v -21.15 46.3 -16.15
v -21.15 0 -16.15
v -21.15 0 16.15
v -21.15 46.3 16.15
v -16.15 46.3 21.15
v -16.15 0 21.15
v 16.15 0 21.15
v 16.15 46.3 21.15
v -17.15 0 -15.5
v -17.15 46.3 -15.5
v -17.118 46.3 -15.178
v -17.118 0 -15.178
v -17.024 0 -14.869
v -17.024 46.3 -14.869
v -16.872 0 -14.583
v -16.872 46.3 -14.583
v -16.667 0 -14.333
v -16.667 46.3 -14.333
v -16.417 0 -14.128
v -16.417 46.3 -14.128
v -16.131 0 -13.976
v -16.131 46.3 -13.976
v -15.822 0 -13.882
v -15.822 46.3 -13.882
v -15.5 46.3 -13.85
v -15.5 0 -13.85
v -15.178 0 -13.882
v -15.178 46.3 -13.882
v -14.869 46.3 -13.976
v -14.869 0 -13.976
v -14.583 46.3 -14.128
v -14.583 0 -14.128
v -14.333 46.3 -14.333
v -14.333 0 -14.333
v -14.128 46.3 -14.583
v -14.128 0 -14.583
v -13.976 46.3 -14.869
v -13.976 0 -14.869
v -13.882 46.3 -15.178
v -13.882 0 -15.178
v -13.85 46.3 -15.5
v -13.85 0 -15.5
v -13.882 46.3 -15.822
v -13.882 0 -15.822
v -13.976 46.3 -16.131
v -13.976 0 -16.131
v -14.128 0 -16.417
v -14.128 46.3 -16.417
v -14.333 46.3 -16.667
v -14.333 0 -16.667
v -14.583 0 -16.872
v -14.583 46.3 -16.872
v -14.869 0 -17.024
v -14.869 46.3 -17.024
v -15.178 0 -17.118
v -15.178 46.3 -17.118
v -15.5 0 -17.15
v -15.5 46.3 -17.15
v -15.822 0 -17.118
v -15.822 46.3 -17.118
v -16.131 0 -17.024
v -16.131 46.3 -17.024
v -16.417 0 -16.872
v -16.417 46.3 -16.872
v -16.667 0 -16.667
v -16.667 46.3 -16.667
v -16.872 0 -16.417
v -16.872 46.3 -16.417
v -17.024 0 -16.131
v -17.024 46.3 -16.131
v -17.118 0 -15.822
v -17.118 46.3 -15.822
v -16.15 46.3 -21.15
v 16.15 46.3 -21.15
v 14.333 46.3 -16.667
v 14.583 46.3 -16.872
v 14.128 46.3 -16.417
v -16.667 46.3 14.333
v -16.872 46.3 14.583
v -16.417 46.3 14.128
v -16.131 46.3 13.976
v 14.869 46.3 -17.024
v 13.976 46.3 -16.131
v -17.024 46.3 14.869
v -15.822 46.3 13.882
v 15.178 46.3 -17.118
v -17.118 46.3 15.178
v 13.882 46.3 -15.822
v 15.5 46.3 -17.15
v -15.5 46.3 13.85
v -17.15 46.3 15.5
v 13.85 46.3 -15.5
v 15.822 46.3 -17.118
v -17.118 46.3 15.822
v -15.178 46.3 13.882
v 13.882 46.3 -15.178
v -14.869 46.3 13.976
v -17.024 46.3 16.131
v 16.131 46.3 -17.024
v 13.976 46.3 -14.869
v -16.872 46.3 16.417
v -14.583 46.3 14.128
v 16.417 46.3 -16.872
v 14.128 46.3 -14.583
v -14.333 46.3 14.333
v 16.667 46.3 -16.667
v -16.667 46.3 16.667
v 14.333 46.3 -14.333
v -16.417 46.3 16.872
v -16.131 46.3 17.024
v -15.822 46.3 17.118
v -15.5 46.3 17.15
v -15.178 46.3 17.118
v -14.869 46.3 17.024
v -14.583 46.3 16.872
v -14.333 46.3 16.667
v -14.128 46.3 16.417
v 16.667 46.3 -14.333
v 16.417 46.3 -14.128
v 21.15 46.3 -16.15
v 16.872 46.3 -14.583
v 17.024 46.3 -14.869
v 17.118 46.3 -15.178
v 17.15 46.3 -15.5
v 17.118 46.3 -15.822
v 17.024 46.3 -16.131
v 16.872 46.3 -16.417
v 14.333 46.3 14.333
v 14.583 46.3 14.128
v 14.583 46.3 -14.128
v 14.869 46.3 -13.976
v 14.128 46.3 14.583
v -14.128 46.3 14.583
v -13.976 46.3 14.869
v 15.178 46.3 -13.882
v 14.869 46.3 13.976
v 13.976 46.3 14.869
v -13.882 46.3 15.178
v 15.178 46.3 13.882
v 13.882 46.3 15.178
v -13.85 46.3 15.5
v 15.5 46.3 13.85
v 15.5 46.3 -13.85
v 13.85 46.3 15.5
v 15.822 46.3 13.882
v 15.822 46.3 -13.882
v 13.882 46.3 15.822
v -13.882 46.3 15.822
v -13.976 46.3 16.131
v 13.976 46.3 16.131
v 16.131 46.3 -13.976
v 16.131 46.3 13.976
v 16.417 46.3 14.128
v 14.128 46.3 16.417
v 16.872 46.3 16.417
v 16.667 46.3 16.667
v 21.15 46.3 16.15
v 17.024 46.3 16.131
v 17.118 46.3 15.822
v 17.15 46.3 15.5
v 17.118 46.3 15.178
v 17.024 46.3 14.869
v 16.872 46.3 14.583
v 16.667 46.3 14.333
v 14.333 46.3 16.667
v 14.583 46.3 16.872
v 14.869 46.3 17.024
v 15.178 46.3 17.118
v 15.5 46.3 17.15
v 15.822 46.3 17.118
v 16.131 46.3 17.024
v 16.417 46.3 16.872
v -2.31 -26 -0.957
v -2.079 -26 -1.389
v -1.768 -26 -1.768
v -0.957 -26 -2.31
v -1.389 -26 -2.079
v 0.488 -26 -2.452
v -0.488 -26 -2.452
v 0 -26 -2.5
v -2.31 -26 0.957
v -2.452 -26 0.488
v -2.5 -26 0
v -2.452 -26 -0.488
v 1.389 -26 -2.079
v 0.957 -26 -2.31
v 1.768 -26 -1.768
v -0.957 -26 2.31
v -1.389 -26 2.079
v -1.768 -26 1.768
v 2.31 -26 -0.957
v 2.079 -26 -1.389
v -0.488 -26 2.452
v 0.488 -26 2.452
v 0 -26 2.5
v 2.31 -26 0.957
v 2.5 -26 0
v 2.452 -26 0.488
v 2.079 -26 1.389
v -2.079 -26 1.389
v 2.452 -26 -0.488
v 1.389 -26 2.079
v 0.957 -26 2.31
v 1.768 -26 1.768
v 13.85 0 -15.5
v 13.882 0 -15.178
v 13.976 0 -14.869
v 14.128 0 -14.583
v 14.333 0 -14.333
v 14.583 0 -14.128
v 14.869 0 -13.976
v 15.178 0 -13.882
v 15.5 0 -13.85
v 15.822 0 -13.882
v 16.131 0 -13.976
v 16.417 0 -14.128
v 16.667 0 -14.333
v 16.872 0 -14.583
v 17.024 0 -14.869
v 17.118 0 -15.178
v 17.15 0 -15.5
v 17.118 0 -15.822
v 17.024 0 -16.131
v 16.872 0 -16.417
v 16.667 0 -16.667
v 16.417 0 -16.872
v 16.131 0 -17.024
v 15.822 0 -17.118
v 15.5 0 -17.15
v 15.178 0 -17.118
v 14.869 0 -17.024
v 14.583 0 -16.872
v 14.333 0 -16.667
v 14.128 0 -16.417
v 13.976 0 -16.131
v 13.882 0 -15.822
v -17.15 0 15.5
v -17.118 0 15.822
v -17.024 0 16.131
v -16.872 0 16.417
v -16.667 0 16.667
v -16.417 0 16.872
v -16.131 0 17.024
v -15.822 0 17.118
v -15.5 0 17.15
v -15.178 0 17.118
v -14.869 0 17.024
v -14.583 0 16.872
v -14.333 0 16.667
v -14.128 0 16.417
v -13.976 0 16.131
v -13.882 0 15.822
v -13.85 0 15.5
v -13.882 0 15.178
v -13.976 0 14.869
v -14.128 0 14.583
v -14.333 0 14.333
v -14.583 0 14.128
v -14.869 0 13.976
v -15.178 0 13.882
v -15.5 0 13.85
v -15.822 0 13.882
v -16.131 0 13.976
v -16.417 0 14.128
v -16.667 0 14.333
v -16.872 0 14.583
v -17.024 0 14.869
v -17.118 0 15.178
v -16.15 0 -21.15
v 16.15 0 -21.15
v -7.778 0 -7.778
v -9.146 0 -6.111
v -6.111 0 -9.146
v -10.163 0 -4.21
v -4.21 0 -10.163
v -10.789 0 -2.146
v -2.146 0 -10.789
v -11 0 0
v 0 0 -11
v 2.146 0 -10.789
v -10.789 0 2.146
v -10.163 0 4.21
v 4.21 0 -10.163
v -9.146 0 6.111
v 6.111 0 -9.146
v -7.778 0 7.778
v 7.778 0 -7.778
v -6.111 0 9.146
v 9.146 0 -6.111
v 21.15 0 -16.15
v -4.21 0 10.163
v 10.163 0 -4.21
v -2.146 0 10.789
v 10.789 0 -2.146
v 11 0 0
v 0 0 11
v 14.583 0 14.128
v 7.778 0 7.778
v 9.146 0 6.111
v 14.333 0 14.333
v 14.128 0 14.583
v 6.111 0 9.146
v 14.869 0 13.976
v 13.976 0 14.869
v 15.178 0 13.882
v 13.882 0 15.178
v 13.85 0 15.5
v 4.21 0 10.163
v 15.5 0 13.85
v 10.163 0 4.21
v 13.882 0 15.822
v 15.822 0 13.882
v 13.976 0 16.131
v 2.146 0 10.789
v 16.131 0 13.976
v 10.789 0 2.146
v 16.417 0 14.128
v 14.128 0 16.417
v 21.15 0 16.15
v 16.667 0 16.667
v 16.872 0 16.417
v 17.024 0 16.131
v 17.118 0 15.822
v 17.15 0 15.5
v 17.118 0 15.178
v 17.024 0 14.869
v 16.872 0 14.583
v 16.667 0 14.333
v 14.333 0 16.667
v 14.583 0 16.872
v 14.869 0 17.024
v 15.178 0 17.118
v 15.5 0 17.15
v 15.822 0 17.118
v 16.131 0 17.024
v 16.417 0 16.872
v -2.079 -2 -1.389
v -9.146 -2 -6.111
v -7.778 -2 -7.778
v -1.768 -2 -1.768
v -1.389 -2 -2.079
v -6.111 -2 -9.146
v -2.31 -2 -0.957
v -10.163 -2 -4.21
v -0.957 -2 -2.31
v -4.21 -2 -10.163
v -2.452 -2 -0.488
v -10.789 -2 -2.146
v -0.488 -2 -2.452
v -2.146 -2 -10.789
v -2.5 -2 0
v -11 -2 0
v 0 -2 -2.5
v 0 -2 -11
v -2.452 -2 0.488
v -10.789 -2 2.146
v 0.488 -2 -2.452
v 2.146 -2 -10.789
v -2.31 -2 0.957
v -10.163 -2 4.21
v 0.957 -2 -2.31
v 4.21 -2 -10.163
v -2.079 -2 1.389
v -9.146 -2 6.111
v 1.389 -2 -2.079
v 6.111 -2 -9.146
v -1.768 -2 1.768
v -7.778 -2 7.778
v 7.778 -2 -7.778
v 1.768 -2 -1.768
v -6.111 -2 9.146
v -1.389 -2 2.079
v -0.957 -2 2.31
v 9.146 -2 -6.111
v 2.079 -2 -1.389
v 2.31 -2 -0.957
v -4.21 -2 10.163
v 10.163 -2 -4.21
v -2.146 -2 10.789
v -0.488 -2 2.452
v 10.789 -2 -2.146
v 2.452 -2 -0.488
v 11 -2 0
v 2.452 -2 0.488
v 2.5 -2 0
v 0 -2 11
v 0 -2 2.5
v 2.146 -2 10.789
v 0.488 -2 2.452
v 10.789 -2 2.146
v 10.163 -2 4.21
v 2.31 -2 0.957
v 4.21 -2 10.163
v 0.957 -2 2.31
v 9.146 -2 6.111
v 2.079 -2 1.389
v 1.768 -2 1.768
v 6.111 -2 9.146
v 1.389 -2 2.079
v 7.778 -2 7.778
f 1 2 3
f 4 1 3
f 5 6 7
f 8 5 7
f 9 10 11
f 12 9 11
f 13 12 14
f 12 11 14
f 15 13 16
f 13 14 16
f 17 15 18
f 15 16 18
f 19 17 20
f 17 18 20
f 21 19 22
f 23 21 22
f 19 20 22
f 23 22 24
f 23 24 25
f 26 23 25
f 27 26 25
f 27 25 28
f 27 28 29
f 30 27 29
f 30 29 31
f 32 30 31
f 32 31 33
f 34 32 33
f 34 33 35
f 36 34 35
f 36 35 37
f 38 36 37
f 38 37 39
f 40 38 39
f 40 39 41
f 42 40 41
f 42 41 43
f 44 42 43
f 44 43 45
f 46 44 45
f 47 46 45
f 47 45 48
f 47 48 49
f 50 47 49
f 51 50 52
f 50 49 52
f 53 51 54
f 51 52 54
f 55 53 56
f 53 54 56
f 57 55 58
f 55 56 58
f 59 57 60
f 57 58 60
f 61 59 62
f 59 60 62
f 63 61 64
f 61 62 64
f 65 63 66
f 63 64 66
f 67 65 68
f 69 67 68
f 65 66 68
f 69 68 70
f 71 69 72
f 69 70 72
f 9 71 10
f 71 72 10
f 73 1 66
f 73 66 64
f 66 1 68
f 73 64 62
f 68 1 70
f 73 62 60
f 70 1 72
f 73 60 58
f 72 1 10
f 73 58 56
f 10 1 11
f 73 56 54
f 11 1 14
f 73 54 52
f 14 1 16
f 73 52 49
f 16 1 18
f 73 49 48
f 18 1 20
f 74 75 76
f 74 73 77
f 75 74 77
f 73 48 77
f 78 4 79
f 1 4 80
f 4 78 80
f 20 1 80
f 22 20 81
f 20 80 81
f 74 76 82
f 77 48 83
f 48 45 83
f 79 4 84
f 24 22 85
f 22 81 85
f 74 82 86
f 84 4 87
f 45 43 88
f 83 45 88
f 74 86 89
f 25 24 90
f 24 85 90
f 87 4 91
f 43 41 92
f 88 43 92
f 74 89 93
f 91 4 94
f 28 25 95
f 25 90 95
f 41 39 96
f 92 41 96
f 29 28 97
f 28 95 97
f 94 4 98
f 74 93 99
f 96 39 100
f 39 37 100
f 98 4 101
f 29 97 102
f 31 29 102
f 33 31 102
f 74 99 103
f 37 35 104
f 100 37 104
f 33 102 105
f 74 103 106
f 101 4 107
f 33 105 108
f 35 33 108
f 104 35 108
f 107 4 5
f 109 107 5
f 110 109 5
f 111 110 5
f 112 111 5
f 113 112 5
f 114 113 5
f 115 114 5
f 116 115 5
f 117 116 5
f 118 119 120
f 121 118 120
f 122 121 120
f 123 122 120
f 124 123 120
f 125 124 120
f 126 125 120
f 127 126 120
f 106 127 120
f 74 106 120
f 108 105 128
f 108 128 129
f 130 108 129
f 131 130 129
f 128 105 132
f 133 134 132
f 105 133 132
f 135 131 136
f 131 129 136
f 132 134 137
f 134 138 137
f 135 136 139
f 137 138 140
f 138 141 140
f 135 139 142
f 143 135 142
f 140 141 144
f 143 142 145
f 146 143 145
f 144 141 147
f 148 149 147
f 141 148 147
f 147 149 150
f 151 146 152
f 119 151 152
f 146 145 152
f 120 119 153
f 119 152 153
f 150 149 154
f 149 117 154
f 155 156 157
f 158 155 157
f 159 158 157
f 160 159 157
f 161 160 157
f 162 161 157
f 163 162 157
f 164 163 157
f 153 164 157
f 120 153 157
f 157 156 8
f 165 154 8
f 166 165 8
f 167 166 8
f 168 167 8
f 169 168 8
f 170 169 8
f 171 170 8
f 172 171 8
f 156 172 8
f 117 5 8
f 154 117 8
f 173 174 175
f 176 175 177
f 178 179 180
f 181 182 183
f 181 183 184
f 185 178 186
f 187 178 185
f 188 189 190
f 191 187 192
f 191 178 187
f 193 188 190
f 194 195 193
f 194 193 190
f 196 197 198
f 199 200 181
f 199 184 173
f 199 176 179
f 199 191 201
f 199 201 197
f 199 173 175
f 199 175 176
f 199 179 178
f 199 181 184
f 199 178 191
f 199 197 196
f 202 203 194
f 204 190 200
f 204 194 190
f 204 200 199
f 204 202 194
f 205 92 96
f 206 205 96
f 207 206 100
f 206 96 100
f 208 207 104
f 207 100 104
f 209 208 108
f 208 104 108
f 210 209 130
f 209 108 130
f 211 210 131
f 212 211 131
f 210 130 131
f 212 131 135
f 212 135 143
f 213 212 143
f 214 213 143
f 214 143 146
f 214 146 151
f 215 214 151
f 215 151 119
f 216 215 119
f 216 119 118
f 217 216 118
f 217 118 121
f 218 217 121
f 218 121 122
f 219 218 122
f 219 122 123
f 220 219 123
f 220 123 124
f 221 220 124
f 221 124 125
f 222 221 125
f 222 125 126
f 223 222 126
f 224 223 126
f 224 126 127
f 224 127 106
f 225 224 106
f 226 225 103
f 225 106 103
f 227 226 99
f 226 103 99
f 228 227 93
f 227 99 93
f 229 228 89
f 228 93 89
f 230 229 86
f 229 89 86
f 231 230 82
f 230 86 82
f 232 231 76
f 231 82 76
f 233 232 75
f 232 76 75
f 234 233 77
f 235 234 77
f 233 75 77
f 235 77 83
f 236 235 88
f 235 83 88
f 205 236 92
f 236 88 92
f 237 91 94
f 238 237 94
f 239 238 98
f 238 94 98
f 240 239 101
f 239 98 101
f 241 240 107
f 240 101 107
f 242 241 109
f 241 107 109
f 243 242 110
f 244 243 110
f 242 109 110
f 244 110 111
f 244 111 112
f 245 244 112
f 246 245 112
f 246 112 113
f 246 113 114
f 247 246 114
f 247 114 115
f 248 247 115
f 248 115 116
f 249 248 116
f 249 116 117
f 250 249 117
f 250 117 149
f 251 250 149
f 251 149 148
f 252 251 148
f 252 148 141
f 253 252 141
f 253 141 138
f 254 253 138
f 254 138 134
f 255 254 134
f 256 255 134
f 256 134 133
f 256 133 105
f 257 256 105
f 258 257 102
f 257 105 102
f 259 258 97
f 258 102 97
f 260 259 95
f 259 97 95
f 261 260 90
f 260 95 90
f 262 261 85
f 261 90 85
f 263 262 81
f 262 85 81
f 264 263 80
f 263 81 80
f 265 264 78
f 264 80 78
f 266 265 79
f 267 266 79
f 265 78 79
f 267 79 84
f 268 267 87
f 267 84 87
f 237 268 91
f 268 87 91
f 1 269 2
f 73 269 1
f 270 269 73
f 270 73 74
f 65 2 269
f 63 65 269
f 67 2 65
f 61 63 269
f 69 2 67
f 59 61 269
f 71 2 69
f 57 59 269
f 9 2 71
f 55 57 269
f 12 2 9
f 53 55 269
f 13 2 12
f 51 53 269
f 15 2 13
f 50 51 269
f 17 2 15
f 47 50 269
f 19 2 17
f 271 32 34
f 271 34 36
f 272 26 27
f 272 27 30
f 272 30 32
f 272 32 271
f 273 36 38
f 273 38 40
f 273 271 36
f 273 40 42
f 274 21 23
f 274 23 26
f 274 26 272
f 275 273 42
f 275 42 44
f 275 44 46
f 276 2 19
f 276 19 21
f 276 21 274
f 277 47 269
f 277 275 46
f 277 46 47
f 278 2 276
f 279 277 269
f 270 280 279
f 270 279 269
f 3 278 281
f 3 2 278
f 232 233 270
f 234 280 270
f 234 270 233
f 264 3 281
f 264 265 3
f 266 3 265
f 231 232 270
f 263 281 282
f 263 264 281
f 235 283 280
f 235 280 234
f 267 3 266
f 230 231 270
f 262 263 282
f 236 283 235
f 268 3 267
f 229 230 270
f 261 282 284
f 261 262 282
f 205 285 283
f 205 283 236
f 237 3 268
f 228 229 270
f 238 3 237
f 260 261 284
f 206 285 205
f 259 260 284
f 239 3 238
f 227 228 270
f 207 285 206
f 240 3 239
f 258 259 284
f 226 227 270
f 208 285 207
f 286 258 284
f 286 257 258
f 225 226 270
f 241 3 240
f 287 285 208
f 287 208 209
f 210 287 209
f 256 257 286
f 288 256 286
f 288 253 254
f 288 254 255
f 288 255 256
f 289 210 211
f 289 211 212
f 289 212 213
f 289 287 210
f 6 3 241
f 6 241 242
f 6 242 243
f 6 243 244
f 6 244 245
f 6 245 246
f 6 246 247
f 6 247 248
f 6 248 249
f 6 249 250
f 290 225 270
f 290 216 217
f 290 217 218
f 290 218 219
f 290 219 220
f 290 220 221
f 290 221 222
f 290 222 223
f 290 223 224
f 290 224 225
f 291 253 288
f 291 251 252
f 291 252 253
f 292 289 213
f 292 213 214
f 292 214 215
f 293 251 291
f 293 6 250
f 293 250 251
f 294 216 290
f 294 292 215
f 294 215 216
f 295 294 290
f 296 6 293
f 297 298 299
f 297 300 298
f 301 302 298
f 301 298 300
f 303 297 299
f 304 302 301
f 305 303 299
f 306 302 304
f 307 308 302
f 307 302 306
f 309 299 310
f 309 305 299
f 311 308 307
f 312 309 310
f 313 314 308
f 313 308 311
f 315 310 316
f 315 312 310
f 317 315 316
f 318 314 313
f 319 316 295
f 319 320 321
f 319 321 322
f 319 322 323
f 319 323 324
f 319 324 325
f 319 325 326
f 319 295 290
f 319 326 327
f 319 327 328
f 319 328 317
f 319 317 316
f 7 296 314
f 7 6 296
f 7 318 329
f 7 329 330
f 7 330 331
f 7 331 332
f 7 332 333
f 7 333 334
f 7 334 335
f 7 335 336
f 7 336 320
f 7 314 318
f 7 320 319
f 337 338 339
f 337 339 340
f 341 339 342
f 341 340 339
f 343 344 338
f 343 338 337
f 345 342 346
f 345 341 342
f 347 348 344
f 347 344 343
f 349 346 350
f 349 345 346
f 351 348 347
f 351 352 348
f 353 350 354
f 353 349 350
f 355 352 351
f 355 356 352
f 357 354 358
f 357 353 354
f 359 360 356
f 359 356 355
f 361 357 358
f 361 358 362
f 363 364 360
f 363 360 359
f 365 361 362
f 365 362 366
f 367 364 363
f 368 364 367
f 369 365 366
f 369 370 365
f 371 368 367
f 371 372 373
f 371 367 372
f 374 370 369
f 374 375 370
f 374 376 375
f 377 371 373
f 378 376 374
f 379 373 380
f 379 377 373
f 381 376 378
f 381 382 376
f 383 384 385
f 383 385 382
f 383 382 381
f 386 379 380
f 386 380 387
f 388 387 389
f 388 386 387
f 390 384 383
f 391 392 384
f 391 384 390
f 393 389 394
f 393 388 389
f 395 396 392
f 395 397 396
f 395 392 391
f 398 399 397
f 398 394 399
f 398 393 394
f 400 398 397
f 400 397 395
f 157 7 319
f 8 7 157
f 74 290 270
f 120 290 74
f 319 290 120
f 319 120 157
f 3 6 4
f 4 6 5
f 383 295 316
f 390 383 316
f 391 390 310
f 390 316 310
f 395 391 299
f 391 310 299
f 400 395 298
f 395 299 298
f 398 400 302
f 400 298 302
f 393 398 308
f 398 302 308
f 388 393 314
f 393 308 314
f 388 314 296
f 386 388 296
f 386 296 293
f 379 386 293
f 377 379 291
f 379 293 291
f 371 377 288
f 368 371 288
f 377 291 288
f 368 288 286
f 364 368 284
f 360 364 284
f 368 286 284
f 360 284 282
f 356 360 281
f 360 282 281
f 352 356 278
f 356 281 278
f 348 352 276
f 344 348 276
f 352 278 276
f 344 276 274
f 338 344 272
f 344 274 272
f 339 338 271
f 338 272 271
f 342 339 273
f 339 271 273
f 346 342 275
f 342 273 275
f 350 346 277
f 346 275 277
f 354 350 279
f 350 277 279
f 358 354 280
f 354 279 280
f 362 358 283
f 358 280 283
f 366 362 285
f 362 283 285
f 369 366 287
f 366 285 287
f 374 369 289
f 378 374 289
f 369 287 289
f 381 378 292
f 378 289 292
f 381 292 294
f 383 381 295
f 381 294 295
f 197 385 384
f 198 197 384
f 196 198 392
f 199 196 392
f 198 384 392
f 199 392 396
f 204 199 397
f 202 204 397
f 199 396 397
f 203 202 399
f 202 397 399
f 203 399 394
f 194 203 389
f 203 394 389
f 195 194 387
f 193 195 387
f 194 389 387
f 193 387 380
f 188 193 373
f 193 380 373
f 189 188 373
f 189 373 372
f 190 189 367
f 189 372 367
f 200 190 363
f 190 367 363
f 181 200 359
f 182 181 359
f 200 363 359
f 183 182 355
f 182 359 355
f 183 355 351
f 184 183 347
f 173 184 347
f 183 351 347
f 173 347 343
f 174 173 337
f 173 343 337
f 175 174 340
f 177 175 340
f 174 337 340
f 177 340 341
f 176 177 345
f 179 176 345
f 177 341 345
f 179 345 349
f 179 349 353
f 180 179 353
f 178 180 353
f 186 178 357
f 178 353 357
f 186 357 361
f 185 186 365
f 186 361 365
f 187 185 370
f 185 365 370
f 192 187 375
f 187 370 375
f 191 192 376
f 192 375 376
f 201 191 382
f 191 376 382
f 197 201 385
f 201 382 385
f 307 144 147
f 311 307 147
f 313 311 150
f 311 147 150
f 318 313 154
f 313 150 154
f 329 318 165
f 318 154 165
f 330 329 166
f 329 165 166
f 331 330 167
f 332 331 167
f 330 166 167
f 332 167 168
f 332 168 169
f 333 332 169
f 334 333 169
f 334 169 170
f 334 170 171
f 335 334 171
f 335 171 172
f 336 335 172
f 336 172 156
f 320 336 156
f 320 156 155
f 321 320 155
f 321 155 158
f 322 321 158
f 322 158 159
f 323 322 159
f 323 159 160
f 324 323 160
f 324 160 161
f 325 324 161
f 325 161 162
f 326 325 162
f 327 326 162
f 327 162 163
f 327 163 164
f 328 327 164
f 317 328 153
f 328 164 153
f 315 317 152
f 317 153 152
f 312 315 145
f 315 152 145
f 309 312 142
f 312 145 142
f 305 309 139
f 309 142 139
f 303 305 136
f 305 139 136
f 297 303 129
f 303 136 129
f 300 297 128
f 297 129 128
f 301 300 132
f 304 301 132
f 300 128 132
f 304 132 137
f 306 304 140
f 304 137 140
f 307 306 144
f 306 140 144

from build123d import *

# Parameters (mm, degrees)
F0_W     = 42.3
F0_H     = 42.3
F1_DEPTH = 46.3
F2_SIZE  = 5
F3_R     = 11
F4_DEPTH = 2
F5_R     = 2.5
F6_DEPTH = 24
F8_D     = 3.3


with BuildPart() as f1:
    # F0 (on Front) → F1 (new body)
    with BuildSketch(Plane.XZ):
        Rectangle(F0_W, F0_H)
    extrude(amount=-F1_DEPTH)

    # F2
    f2_edges = [f1.edges().sort_by_distance(p)[0] for p in [
        (-21.15, 23.15, 21.15),
        (21.15, 23.15, 21.15),
        (-21.15, 23.15, -21.15),
        (21.15, 23.15, -21.15),
    ]]
    chamfer(f2_edges, length=F2_SIZE)

    # F3 (on face) → F4 (join)
    with BuildSketch(Plane.XZ):
        Circle(F3_R)
    extrude(amount=F4_DEPTH)

    # F5 (on face) → F6 (join)
    with BuildSketch(Plane.XZ.offset(2)):
        Circle(F5_R)
    extrude(amount=F6_DEPTH)

    # F8 (through all)
    with Locations(Plane.XZ):
        with Locations((15.5, 15.5), (-15.5, 15.5), (-15.5, -15.5), (15.5, -15.5)):
            Hole(F8_D / 2)


solid = f1.part
